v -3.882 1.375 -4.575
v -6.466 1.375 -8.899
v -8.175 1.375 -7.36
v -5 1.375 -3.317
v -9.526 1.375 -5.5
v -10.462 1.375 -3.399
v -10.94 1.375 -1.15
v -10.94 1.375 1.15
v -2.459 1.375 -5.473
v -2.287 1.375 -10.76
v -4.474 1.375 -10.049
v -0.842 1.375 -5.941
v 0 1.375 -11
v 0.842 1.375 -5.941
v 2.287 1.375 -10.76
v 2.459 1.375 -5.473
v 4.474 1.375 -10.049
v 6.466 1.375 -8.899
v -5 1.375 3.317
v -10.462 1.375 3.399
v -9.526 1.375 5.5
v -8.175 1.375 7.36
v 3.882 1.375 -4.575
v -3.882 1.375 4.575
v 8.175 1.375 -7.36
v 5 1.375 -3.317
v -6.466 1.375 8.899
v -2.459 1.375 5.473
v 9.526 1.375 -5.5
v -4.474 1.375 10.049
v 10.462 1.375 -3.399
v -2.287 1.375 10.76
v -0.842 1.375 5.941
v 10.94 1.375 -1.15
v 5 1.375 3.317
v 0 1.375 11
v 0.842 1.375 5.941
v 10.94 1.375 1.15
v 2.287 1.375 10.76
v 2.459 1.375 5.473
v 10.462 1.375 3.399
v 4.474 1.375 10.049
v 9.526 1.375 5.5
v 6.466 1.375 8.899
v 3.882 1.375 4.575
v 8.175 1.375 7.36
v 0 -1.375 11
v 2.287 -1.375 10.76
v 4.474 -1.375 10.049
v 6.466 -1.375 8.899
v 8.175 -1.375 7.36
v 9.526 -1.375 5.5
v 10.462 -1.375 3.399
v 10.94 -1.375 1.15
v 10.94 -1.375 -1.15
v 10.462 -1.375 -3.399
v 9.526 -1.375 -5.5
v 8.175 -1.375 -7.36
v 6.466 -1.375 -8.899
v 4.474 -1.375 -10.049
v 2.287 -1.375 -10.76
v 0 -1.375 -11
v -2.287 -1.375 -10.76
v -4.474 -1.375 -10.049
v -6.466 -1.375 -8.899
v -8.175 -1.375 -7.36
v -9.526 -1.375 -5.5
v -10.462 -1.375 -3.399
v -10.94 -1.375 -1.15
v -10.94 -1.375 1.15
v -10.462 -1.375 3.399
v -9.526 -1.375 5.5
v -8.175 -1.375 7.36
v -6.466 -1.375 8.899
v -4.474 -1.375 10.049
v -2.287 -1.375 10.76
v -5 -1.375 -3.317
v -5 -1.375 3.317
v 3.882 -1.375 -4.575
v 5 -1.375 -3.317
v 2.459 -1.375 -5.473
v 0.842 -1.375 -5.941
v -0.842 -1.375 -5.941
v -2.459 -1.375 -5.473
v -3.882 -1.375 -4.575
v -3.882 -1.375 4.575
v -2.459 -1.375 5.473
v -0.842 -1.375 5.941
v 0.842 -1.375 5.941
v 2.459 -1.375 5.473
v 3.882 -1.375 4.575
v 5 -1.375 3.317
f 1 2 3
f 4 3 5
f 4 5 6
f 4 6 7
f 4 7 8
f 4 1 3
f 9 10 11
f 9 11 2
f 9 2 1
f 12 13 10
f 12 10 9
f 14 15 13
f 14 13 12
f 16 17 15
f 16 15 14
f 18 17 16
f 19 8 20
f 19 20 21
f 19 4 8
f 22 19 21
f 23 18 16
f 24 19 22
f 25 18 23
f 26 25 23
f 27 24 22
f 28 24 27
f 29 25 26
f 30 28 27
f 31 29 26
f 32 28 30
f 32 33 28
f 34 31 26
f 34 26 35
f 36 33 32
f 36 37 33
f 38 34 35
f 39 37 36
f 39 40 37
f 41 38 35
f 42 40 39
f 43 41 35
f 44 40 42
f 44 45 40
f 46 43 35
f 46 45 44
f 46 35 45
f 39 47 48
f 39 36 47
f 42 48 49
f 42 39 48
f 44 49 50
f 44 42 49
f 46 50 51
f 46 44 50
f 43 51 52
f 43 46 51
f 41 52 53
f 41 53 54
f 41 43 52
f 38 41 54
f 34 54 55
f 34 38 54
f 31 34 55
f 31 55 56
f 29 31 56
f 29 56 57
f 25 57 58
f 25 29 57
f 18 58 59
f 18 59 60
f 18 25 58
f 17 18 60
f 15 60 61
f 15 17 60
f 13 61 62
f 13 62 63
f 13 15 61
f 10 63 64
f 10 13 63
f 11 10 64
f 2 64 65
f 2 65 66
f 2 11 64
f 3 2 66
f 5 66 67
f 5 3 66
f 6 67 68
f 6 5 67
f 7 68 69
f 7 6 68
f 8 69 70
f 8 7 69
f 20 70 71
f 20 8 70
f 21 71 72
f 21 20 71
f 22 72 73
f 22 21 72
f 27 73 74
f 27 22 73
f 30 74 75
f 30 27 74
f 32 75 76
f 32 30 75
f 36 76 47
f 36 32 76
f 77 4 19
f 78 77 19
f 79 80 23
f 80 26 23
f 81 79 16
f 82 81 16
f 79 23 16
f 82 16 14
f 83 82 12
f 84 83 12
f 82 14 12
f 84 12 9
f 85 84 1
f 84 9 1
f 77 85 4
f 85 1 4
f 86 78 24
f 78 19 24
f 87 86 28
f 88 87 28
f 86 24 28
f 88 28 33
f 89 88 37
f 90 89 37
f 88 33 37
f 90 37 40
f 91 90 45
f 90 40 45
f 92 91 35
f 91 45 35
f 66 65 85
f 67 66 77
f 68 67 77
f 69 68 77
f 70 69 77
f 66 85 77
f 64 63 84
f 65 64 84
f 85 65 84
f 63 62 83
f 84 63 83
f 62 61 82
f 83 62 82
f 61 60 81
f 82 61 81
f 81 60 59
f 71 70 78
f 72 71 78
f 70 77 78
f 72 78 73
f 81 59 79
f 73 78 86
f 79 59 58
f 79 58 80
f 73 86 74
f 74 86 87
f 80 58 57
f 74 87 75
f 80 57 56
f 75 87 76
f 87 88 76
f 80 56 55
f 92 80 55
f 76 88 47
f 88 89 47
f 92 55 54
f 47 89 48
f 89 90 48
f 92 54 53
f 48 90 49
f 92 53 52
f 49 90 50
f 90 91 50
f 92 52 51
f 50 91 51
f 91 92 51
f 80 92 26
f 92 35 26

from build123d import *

# Parameters (mm, degrees)
SKETCH1_R           = 11
BOSS_EXTRUDE1_DEPTH = 1.375


with BuildPart() as part:
    # Sketch1 → Boss-Extrude1 (new, symmetric)
    with BuildSketch(Plane(origin=(0, 0, 0), x_dir=(1, 0, 0), z_dir=(0, 1, 0))):
        with Locations(Location((0, 0, 0), (0, 0, 270))):
            Circle(SKETCH1_R)
        with BuildLine():
            Line((-5, 3.31662479), (-5, -3.31662479))
            ThreePointArc((-5, -3.31662479), (0, -6), (5, -3.31662479))
            Line((5, -3.31662479), (5, 3.31662479))
            ThreePointArc((5, 3.31662479), (0, 6), (-5, 3.31662479))
        make_face(mode=Mode.SUBTRACT)
    extrude(amount=BOSS_EXTRUDE1_DEPTH, both=True)


solid = part.part
